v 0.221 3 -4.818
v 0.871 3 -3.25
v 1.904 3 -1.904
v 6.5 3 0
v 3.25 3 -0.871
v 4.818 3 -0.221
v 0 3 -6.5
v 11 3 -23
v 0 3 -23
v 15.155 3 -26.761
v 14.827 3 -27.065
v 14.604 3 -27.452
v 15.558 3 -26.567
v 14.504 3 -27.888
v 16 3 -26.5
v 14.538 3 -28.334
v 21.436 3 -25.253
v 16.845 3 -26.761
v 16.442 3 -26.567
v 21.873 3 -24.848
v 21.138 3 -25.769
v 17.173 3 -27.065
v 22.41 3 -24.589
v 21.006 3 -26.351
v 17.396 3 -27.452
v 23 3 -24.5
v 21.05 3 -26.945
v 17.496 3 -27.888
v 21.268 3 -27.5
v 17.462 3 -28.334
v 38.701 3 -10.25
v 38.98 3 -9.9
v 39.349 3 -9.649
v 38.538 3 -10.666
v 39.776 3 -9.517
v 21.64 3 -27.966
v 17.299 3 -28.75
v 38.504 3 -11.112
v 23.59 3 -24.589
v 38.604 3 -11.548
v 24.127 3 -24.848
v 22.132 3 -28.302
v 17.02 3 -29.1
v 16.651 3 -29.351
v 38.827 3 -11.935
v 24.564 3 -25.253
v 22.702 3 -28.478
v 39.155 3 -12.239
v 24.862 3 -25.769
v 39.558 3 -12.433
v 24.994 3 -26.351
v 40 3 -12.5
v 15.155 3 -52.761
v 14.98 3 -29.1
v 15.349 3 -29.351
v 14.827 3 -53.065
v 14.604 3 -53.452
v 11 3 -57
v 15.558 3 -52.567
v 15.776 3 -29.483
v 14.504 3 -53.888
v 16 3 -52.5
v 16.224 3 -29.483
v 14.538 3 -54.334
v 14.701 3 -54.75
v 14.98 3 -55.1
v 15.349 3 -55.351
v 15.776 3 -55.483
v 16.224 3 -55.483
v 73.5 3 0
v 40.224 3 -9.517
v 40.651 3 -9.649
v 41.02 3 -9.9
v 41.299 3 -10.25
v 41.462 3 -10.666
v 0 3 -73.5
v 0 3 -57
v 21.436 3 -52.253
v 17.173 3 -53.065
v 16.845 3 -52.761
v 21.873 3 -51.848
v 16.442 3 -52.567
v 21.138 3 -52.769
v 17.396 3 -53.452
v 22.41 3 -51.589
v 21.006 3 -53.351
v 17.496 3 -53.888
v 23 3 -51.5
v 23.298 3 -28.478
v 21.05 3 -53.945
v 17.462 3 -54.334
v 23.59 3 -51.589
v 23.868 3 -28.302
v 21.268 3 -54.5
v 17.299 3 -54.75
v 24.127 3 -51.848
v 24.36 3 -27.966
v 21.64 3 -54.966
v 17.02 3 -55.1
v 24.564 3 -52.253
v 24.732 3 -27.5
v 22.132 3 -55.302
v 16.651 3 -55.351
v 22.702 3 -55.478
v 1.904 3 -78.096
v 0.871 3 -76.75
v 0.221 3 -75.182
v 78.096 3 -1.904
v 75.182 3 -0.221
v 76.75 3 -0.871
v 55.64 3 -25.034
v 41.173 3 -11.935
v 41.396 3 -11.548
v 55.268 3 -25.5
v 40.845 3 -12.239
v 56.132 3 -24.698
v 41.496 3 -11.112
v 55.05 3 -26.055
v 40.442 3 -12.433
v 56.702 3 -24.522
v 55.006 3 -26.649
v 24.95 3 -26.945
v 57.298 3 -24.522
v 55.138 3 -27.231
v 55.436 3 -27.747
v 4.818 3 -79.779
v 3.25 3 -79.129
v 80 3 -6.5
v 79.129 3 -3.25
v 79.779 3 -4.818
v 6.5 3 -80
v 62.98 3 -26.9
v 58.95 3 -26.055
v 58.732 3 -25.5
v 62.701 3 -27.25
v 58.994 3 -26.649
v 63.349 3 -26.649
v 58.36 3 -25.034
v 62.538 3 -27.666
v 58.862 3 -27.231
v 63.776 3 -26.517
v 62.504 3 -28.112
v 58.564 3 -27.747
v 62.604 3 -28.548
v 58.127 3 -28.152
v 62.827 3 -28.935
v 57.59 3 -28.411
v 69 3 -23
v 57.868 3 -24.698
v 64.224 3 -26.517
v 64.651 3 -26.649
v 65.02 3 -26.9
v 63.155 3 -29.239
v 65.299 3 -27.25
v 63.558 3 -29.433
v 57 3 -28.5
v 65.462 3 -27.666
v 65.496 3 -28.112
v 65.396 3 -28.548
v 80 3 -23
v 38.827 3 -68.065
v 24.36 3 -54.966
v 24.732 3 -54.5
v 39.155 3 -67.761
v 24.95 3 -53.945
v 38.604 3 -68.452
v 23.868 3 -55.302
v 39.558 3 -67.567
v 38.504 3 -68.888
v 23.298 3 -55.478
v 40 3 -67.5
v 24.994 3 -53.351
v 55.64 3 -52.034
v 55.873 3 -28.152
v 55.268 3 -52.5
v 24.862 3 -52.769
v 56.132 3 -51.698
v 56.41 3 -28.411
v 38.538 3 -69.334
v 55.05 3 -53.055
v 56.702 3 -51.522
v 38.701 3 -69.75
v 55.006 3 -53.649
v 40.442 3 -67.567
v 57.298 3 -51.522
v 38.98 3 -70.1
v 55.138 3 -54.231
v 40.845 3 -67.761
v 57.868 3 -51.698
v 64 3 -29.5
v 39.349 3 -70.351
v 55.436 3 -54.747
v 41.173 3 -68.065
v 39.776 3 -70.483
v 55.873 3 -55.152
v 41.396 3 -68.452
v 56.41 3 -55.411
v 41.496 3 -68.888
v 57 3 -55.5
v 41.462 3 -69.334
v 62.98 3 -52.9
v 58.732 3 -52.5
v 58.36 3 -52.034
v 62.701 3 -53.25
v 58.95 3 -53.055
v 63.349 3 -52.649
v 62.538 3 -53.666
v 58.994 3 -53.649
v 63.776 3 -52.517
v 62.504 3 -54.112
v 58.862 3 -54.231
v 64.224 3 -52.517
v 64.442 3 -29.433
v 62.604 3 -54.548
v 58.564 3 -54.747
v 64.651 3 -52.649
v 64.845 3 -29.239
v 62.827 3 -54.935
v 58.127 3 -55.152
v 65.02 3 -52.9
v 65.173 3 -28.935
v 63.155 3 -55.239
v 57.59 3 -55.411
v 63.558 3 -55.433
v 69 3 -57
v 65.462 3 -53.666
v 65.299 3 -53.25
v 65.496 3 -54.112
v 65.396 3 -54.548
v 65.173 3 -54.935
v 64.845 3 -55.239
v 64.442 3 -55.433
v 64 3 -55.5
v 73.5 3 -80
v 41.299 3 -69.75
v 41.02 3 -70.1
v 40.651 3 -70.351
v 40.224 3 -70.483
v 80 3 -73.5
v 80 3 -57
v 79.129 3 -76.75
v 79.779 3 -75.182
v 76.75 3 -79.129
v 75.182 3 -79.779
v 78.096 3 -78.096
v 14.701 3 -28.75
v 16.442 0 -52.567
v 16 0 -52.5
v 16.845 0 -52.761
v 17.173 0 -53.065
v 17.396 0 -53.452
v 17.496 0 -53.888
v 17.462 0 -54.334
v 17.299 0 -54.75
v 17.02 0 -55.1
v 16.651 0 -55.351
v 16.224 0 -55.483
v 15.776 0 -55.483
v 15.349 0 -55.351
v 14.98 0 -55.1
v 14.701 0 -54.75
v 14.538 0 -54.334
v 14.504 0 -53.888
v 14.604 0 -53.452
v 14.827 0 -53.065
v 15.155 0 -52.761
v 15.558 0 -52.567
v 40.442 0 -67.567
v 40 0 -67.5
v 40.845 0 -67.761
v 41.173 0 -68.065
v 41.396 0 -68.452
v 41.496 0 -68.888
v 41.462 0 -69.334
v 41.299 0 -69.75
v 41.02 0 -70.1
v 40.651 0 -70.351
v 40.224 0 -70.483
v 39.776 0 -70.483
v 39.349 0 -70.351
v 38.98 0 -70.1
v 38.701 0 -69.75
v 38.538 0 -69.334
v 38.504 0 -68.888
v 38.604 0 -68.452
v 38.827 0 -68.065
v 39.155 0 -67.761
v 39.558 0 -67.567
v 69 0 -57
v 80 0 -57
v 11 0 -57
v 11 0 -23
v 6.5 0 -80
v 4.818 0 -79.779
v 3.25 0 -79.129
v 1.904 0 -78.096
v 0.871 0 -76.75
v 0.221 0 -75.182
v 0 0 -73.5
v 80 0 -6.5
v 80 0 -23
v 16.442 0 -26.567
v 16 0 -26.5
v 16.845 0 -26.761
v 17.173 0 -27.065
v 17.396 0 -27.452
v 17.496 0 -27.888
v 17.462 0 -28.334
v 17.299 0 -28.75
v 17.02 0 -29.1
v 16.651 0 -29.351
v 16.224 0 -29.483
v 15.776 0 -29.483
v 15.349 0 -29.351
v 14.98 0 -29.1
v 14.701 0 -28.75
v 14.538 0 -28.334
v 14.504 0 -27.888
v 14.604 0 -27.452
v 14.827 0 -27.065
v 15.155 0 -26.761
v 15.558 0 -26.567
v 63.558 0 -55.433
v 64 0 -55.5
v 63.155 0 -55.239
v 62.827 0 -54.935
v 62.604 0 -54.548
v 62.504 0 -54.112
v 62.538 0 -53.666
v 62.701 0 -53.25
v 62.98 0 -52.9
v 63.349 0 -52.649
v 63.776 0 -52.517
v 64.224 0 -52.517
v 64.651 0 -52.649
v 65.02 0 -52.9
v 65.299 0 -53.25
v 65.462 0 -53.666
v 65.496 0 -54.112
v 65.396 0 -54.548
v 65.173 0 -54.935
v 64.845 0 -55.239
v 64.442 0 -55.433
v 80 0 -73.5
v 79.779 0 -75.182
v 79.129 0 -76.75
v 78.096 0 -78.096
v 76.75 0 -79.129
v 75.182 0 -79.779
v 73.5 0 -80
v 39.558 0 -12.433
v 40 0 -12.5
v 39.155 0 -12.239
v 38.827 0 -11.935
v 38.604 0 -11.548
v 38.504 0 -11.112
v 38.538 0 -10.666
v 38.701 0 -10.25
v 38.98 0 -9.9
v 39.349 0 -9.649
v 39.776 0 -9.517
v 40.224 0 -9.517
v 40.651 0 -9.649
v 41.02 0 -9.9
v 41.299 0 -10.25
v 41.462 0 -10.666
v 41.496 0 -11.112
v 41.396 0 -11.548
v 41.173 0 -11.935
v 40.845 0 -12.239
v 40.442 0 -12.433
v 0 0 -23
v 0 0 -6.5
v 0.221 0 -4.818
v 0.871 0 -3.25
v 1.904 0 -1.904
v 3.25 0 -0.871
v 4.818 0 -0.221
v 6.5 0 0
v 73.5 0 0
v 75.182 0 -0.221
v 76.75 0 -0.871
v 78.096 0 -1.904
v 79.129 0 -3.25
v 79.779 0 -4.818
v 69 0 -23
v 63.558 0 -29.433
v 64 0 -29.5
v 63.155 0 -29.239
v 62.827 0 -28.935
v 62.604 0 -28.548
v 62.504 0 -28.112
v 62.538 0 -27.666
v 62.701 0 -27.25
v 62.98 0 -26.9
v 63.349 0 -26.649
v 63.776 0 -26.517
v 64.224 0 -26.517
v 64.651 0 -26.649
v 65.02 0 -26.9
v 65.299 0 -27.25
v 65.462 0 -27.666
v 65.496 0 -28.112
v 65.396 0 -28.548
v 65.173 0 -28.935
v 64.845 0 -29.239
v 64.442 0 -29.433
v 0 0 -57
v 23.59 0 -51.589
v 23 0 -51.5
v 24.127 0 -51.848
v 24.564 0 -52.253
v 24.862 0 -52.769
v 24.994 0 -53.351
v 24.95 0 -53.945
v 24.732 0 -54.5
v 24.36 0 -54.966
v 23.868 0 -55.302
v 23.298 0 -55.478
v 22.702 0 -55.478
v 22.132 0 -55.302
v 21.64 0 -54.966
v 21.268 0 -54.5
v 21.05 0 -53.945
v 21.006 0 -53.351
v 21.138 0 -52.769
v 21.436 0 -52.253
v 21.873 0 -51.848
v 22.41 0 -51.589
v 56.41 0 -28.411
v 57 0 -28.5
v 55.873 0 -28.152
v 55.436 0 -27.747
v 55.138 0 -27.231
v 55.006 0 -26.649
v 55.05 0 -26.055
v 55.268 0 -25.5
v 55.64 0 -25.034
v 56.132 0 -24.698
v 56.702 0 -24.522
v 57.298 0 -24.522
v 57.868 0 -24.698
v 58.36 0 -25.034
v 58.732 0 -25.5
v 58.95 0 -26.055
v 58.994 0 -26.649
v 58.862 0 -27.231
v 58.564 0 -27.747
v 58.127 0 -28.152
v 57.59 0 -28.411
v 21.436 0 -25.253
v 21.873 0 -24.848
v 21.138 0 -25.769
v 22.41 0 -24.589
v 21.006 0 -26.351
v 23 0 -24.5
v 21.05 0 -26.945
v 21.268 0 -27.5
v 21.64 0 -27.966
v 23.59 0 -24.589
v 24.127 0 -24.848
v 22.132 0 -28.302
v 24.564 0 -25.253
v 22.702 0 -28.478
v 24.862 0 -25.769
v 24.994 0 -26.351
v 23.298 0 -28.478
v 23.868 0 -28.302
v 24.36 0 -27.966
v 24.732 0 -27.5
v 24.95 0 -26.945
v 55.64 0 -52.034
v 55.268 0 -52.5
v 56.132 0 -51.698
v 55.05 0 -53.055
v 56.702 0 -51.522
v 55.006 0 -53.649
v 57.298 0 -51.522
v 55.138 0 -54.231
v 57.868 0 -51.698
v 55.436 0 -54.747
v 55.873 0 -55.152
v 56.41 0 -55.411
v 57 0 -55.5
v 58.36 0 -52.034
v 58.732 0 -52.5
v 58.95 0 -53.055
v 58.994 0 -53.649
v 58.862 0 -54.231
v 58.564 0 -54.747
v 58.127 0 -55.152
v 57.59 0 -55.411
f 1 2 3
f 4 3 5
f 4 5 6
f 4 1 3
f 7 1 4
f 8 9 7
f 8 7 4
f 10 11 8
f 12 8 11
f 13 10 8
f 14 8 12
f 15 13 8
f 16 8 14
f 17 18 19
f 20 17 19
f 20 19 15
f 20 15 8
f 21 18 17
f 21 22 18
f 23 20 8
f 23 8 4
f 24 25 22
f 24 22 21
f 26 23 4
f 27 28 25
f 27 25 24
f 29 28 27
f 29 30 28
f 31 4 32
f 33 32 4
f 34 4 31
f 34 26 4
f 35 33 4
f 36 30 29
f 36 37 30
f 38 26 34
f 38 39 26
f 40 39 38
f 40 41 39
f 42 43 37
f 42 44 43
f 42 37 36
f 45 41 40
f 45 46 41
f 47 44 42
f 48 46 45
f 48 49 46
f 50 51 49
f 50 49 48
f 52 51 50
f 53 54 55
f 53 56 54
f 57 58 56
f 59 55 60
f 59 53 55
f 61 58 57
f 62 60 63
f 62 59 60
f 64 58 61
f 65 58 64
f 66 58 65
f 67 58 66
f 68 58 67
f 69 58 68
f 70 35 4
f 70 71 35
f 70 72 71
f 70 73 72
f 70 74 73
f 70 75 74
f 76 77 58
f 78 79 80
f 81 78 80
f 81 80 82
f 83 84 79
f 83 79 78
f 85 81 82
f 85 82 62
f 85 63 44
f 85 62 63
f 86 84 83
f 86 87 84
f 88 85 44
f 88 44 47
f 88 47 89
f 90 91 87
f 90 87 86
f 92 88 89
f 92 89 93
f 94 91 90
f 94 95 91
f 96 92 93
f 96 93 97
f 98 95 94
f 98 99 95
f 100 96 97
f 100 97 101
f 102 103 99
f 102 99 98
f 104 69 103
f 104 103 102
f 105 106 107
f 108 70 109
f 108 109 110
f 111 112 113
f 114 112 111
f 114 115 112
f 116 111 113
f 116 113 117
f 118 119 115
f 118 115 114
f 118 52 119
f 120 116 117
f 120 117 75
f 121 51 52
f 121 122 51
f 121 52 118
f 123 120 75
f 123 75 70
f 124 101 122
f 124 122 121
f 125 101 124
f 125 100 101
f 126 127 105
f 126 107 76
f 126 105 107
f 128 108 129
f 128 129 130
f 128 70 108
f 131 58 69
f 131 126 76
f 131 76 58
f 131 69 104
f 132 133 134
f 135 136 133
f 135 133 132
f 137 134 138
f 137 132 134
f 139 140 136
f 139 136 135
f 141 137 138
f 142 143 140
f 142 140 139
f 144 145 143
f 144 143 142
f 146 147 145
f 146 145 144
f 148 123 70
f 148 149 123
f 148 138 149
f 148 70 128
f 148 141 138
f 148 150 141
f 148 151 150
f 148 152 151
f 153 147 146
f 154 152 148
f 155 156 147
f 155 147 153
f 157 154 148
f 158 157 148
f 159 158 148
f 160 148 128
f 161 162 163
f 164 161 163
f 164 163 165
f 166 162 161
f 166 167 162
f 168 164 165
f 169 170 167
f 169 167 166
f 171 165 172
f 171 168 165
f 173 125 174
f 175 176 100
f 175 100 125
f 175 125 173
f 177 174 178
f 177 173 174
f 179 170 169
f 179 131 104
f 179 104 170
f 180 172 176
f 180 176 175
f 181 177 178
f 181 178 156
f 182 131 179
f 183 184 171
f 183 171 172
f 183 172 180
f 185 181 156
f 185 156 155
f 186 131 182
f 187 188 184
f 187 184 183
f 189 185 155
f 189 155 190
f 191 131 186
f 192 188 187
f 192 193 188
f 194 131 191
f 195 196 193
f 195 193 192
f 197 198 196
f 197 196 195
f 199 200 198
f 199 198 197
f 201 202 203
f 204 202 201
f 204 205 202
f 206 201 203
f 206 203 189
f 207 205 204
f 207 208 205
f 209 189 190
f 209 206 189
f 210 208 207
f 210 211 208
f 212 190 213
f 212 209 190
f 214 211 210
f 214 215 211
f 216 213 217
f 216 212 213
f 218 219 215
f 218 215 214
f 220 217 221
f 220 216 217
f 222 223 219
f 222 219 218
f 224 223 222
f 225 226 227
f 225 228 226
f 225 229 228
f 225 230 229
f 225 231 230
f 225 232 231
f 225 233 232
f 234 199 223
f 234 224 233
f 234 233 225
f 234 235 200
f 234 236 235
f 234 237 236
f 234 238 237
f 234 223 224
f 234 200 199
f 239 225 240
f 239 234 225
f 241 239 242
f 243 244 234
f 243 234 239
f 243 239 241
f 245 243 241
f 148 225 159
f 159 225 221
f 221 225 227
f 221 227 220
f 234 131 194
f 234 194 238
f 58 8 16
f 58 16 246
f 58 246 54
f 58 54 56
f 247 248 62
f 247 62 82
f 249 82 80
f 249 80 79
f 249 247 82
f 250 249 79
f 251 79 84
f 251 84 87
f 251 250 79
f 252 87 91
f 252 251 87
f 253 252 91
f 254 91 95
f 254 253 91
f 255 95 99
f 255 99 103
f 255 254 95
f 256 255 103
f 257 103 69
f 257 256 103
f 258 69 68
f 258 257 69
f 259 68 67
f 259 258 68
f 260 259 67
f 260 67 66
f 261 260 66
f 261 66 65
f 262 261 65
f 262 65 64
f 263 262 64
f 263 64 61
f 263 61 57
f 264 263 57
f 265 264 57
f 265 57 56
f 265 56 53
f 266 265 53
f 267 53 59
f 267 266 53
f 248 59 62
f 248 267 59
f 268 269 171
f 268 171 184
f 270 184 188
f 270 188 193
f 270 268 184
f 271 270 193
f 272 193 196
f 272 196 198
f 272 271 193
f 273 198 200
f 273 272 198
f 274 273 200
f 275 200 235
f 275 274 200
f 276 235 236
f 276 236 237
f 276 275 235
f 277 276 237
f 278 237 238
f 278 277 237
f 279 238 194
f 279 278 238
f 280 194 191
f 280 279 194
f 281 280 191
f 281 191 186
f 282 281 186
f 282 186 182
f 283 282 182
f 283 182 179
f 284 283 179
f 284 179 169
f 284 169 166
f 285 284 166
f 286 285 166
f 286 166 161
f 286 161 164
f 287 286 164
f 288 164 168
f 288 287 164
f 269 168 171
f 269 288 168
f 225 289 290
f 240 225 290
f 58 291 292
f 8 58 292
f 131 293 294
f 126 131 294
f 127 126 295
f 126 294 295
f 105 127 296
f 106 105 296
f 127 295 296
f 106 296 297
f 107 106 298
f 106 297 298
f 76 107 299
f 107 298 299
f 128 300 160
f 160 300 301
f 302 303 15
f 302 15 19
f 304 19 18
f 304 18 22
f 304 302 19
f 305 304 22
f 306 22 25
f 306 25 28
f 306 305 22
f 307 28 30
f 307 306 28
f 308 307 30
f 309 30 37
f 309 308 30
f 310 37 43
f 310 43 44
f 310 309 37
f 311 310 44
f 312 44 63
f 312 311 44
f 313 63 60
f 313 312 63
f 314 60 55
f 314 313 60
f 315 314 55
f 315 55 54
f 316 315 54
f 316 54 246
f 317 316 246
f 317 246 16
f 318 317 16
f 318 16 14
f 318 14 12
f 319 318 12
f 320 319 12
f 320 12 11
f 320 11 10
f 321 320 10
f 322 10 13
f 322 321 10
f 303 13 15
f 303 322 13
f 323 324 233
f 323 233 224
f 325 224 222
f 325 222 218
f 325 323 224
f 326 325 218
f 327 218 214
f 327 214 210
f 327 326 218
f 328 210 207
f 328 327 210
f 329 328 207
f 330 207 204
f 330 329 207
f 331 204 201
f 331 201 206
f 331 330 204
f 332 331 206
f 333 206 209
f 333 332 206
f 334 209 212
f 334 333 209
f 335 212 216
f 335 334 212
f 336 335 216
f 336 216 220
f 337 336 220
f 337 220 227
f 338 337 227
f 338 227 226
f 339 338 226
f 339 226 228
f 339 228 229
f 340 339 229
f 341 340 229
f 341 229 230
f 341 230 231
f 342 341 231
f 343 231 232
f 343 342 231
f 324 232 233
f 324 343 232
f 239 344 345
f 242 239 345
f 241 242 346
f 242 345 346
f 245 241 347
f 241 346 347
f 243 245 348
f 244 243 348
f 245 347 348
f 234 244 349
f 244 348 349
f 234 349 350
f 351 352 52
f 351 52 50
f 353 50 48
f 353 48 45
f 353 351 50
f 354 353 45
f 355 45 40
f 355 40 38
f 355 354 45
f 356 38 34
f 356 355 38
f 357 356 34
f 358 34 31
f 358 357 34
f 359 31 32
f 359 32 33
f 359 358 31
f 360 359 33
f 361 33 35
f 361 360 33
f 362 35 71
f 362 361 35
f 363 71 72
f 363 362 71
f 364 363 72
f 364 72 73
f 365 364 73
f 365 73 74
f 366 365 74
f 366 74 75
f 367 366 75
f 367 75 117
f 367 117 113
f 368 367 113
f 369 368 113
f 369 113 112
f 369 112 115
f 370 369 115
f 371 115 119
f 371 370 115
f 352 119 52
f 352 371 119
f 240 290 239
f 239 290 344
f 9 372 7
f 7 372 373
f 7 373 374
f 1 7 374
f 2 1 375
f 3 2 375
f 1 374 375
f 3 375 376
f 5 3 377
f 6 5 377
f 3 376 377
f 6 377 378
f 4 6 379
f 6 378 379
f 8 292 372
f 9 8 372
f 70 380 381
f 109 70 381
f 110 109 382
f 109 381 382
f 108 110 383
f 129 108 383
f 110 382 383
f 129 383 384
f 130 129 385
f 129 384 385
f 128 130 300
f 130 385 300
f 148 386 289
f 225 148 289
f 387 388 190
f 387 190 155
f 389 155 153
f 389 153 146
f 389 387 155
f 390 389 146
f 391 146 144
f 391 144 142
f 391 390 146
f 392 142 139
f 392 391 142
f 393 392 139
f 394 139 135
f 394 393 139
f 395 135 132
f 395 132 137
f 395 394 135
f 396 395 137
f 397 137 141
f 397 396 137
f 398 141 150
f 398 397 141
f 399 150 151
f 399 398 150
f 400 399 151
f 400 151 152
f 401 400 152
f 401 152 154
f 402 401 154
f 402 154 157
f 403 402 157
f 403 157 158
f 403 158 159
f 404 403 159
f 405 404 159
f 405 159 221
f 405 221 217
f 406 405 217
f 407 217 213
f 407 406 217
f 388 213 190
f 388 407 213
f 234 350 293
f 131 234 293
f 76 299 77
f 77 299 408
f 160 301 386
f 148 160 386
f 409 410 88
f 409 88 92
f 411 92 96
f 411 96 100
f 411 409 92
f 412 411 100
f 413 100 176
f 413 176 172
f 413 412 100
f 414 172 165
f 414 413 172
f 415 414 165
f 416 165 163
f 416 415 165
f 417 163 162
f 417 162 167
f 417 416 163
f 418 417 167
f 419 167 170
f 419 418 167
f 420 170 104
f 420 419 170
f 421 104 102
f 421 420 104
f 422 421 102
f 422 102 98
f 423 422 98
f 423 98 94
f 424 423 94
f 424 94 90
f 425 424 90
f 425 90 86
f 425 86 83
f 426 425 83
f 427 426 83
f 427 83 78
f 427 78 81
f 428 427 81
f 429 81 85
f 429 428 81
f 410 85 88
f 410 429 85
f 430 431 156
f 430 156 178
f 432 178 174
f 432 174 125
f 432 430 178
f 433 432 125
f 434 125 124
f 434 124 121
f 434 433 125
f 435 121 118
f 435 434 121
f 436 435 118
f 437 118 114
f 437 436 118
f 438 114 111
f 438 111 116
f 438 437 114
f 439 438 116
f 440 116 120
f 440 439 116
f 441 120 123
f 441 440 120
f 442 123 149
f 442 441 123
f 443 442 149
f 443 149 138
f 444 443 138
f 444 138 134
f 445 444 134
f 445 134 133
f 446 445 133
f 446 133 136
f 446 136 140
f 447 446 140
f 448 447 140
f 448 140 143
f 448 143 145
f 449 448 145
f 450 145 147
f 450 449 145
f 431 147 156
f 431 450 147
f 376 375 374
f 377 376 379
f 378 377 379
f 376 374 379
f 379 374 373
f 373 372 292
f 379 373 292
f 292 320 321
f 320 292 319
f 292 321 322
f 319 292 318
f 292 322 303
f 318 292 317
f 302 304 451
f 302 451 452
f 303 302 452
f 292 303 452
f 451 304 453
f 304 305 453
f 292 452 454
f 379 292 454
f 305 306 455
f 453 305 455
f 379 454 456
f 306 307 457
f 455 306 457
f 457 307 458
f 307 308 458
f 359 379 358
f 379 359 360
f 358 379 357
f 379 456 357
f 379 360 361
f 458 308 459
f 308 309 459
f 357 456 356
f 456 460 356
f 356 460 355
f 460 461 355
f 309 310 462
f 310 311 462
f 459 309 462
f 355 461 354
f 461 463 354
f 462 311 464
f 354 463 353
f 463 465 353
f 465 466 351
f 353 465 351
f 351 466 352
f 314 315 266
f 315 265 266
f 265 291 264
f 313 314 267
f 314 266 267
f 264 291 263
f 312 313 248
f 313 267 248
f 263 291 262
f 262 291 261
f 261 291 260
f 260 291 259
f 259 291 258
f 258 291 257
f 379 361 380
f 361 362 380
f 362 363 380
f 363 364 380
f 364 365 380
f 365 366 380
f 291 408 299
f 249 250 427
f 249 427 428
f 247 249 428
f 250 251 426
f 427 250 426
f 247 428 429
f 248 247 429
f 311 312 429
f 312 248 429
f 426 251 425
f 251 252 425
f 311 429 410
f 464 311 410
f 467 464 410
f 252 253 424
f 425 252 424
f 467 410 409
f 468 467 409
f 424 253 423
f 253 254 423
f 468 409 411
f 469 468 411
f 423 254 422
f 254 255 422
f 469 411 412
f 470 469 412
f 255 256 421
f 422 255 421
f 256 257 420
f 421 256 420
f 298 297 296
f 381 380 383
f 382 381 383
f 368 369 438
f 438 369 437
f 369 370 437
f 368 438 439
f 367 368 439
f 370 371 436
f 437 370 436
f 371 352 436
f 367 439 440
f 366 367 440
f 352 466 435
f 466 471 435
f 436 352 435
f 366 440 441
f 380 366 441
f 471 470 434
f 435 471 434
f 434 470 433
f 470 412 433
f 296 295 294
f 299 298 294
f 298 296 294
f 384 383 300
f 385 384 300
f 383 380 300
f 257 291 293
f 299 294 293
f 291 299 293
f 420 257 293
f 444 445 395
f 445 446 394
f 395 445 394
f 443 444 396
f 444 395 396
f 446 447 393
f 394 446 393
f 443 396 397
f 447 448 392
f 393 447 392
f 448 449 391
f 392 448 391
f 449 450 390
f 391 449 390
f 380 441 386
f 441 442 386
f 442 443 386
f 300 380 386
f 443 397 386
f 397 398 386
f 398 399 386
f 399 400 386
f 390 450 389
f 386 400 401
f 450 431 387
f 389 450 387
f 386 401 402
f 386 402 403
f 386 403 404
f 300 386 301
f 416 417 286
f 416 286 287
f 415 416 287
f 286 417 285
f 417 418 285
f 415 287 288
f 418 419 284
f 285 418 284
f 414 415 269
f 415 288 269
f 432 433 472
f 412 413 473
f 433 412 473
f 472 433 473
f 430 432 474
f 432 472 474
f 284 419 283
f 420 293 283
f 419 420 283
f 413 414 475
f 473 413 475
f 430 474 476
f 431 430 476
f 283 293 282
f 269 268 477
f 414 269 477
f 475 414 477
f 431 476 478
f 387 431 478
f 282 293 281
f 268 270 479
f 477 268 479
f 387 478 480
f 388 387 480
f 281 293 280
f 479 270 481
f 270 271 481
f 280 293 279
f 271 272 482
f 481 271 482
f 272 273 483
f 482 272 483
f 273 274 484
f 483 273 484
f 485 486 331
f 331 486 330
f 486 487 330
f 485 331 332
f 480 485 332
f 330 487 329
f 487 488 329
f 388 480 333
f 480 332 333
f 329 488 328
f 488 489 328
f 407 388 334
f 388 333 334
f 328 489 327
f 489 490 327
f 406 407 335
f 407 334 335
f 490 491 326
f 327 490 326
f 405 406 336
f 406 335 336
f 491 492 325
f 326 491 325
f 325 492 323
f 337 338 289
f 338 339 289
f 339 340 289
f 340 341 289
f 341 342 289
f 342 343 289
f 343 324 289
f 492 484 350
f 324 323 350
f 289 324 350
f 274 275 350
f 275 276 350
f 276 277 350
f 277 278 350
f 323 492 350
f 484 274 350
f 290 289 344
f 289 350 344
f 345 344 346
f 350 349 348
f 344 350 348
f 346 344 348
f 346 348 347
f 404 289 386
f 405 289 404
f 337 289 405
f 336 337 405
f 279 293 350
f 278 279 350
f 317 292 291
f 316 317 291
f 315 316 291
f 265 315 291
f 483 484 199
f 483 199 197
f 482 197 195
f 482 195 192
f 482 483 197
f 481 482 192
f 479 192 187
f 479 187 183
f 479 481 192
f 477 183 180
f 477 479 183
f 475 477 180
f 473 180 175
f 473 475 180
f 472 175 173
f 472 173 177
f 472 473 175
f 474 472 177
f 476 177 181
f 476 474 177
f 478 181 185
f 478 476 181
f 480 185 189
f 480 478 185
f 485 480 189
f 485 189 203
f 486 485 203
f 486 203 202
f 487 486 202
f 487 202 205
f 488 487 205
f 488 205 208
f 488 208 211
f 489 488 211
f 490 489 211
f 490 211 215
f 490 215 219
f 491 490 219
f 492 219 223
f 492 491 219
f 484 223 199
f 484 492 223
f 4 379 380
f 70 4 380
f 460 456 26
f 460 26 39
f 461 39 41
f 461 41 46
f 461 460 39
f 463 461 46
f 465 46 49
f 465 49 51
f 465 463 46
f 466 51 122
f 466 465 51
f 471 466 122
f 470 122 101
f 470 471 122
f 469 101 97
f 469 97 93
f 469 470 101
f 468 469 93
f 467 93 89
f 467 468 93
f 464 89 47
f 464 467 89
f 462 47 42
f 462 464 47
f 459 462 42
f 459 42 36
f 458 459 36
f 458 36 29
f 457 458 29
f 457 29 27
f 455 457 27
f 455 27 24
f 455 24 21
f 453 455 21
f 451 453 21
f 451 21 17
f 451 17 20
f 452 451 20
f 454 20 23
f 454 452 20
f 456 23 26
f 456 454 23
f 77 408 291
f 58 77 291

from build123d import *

# Parameters (mm, degrees)
SKETCH1_R           = 1.5
SKETCH1_R_2         = 2
BOSS_EXTRUDE1_DEPTH = 3


with BuildPart() as part:
    # Sketch1 → Boss-Extrude1 (new body)
    with BuildSketch(Plane(origin=(0, 0, 0), x_dir=(1, 0, 0), z_dir=(0, 1, 0))):
        with BuildLine():
            Line((6.5, 0), (73.5, 0))
            ThreePointArc((73.5, 0), (78.096194078, 1.903805922), (80, 6.5))
            Line((80, 6.5), (80, 23))
            Line((80, 23), (69, 23))
            Line((69, 23), (69, 57))
            Line((69, 57), (80, 57))
            Line((80, 57), (80, 73.5))
            ThreePointArc((80, 73.5), (78.096194078, 78.096194078), (73.5, 80))
            Line((73.5, 80), (6.5, 80))
            ThreePointArc((6.5, 80), (1.903805922, 78.096194078), (0, 73.5))
            Line((0, 73.5), (0, 57))
            Line((0, 57), (11, 57))
            Line((11, 57), (11, 23))
            Line((11, 23), (0, 23))
            Line((0, 23), (0, 6.5))
            ThreePointArc((0, 6.5), (1.903805922, 1.903805922), (6.5, 0))
        make_face()
        with Locations(Location((16, 54, 0), (0, 0, 270))):
            Circle(SKETCH1_R, mode=Mode.SUBTRACT)
        with Locations(Location((16, 28, 0), (0, 0, 270))):
            Circle(SKETCH1_R, mode=Mode.SUBTRACT)
        with Locations(Location((64, 28, 0), (0, 0, 90))):
            Circle(SKETCH1_R, mode=Mode.SUBTRACT)
        with Locations(Location((64, 54, 0), (0, 0, 90))):
            Circle(SKETCH1_R, mode=Mode.SUBTRACT)
        with Locations(Location((23, 53.5, 0), (0, 0, 270))):
            Circle(SKETCH1_R_2, mode=Mode.SUBTRACT)
        with Locations(Location((23, 26.5, 0), (0, 0, 270))):
            Circle(SKETCH1_R_2, mode=Mode.SUBTRACT)
        with Locations(Location((57, 26.5, 0), (0, 0, 90))):
            Circle(SKETCH1_R_2, mode=Mode.SUBTRACT)
        with Locations(Location((57, 53.5, 0), (0, 0, 90))):
            Circle(SKETCH1_R_2, mode=Mode.SUBTRACT)
        with Locations(Location((40, 69, 0), (0, 0, 270))):
            Circle(SKETCH1_R, mode=Mode.SUBTRACT)
        with Locations(Location((40, 11, 0), (0, 0, 90))):
            Circle(SKETCH1_R, mode=Mode.SUBTRACT)
    extrude(amount=BOSS_EXTRUDE1_DEPTH)


solid = part.part
